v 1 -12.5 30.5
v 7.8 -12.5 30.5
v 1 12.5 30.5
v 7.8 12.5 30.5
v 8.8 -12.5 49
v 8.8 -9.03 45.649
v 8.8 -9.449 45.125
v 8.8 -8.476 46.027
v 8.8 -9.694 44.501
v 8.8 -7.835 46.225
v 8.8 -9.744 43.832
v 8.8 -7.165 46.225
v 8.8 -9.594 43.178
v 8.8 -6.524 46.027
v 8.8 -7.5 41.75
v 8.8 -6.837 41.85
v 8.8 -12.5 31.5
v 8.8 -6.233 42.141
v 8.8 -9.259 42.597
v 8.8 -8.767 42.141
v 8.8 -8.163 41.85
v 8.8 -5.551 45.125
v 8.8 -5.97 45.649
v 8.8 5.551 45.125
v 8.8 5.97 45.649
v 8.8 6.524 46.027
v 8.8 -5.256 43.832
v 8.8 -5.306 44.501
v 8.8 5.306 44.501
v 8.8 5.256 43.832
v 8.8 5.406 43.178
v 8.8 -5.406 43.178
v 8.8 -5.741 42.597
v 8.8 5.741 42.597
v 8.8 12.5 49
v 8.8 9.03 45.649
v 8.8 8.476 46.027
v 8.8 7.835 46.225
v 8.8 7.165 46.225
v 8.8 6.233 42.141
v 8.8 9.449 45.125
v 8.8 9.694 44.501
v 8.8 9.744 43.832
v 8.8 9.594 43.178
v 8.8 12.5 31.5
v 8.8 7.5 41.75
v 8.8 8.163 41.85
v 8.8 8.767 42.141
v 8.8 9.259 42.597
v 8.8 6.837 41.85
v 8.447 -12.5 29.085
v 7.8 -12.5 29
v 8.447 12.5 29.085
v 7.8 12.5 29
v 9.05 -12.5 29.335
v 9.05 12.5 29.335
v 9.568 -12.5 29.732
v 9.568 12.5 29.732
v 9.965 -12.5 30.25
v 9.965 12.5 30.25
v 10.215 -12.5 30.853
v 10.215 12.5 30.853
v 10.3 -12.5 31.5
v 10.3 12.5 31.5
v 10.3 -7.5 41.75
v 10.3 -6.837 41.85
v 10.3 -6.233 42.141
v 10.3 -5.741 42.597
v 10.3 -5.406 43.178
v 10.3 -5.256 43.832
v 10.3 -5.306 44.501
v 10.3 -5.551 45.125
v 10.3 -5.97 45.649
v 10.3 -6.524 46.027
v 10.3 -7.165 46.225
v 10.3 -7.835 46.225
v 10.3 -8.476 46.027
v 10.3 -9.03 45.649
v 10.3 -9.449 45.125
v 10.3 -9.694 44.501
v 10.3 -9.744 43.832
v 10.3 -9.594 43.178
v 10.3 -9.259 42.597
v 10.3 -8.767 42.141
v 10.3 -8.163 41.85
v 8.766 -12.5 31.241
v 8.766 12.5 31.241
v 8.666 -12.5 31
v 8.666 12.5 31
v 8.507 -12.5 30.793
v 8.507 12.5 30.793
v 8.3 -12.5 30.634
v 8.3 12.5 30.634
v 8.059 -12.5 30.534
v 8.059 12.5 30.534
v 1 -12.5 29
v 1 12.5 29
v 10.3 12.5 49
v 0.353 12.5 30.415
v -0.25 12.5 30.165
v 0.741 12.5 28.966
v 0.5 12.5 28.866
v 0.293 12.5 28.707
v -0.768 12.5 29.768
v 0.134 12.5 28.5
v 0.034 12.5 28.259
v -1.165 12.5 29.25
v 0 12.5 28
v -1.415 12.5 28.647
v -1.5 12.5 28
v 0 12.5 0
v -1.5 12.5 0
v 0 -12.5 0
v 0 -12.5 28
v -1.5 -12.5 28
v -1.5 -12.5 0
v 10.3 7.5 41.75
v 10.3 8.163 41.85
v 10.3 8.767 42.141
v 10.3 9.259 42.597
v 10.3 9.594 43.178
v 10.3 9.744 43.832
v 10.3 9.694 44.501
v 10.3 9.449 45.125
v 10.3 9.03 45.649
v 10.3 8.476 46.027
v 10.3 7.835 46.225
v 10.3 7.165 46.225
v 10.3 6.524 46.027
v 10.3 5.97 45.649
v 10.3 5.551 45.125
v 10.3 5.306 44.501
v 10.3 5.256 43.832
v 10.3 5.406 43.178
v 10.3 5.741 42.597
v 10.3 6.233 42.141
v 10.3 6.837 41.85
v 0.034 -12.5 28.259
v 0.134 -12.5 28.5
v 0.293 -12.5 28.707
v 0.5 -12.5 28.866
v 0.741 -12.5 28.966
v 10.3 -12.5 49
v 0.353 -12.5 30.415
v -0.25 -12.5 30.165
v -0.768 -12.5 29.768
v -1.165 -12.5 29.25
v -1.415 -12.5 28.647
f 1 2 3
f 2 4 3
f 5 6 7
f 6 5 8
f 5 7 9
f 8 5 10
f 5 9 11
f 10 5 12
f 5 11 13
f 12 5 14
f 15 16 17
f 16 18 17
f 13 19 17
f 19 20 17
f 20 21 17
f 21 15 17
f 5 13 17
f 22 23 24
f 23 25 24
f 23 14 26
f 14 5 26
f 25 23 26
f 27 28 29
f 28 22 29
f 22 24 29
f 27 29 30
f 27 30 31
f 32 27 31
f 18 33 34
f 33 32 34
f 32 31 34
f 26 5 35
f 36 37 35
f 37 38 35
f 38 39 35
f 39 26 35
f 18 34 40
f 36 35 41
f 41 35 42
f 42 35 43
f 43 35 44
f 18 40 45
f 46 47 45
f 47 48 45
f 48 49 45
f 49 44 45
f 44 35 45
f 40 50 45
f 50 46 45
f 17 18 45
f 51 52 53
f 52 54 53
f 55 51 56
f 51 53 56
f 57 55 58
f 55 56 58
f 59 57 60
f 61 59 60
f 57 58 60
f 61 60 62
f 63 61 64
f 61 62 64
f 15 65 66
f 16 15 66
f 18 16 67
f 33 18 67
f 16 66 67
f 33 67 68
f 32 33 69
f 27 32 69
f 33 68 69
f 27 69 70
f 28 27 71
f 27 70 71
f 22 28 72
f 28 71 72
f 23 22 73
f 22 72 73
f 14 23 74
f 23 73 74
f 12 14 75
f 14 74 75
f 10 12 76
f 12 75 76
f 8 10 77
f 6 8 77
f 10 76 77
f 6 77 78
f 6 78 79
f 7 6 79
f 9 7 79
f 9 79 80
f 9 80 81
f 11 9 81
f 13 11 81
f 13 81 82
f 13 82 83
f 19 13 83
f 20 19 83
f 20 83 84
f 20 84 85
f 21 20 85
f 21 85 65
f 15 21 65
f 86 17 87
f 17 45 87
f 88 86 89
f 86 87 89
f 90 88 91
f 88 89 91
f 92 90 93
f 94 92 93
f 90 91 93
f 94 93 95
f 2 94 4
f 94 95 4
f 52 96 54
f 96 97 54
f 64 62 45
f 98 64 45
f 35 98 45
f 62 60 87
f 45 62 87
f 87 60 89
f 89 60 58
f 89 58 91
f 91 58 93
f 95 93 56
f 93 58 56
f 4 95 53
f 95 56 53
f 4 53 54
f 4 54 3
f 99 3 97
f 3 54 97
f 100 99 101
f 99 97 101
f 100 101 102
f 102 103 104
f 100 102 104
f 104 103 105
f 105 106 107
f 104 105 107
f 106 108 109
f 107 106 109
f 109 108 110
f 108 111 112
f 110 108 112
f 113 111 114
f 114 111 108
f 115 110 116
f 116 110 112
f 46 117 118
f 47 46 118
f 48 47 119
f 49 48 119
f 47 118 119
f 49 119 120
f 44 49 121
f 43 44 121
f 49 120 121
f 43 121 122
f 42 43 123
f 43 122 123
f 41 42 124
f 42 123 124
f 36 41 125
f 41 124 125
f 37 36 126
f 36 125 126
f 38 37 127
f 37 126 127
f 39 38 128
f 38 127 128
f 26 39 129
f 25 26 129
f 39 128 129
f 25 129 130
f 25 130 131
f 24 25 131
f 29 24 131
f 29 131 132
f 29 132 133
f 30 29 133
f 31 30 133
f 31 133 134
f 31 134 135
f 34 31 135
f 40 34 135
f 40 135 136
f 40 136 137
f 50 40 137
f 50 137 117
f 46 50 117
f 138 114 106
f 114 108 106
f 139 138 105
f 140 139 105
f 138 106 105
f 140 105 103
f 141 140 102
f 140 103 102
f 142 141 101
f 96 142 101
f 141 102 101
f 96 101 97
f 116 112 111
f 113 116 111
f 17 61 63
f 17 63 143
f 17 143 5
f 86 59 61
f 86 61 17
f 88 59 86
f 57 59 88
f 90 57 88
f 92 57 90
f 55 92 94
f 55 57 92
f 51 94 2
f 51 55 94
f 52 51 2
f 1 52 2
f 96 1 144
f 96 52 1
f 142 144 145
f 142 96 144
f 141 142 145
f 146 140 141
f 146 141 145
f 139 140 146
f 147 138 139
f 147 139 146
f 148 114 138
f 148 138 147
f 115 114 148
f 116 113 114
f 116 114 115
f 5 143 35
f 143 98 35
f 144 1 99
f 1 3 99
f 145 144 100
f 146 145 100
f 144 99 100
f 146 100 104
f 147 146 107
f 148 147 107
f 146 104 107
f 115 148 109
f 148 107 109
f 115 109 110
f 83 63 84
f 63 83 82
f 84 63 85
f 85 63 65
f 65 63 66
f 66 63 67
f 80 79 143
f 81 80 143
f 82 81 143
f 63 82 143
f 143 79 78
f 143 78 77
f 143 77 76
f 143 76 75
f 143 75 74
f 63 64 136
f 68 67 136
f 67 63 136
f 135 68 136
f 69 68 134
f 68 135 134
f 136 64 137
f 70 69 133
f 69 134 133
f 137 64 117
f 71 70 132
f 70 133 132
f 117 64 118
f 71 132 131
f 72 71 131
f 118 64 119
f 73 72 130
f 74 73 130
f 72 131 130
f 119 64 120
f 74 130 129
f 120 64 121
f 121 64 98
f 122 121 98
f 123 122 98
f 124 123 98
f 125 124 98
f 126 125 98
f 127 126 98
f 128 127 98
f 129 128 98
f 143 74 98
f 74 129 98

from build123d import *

# Parameters (mm, degrees)
SM_BASE_FLANGE_1_DEPTH = 12.5
HOLE_WIZARD_M4_1_D     = 4.5


# Sheet-metal steps are written as plain solids
with BuildPart() as part:
    # Sketch 1 → 基体-法兰1 (new, symmetric)
    with BuildSketch(Plane(origin=(0, 0, 0), x_dir=(1, 0, 0), z_dir=(0, 1, 0))):
        with BuildLine():
            Line((0, 0), (0, -28))
            ThreePointArc((0, -28), (0.292893219, -28.707106781), (1, -29))
            Line((1, -29), (7.8, -29))
            ThreePointArc((7.8, -29), (9.567766953, -29.732233047), (10.3, -31.5))
            Line((10.3, -31.5), (10.3, -49))
            Line((10.3, -49), (8.8, -49))
            Line((8.8, -49), (8.8, -31.5))
            ThreePointArc((8.8, -31.5), (8.507106781, -30.792893219), (7.8, -30.5))
            Line((7.8, -30.5), (1, -30.5))
            ThreePointArc((1, -30.5), (-0.767766953, -29.767766953), (-1.5, -28))
            Line((-1.5, -28), (-1.5, 0))
            Line((-1.5, 0), (0, 0))
        make_face()
    extrude(amount=SM_BASE_FLANGE_1_DEPTH, both=True)

    # M4 间隙孔1 (through all)
    with Locations(Plane.ZY.offset(-8.8)):
        with Locations((44, 7.5), (44, -7.5)):
            Hole(HOLE_WIZARD_M4_1_D / 2)


solid = part.part
